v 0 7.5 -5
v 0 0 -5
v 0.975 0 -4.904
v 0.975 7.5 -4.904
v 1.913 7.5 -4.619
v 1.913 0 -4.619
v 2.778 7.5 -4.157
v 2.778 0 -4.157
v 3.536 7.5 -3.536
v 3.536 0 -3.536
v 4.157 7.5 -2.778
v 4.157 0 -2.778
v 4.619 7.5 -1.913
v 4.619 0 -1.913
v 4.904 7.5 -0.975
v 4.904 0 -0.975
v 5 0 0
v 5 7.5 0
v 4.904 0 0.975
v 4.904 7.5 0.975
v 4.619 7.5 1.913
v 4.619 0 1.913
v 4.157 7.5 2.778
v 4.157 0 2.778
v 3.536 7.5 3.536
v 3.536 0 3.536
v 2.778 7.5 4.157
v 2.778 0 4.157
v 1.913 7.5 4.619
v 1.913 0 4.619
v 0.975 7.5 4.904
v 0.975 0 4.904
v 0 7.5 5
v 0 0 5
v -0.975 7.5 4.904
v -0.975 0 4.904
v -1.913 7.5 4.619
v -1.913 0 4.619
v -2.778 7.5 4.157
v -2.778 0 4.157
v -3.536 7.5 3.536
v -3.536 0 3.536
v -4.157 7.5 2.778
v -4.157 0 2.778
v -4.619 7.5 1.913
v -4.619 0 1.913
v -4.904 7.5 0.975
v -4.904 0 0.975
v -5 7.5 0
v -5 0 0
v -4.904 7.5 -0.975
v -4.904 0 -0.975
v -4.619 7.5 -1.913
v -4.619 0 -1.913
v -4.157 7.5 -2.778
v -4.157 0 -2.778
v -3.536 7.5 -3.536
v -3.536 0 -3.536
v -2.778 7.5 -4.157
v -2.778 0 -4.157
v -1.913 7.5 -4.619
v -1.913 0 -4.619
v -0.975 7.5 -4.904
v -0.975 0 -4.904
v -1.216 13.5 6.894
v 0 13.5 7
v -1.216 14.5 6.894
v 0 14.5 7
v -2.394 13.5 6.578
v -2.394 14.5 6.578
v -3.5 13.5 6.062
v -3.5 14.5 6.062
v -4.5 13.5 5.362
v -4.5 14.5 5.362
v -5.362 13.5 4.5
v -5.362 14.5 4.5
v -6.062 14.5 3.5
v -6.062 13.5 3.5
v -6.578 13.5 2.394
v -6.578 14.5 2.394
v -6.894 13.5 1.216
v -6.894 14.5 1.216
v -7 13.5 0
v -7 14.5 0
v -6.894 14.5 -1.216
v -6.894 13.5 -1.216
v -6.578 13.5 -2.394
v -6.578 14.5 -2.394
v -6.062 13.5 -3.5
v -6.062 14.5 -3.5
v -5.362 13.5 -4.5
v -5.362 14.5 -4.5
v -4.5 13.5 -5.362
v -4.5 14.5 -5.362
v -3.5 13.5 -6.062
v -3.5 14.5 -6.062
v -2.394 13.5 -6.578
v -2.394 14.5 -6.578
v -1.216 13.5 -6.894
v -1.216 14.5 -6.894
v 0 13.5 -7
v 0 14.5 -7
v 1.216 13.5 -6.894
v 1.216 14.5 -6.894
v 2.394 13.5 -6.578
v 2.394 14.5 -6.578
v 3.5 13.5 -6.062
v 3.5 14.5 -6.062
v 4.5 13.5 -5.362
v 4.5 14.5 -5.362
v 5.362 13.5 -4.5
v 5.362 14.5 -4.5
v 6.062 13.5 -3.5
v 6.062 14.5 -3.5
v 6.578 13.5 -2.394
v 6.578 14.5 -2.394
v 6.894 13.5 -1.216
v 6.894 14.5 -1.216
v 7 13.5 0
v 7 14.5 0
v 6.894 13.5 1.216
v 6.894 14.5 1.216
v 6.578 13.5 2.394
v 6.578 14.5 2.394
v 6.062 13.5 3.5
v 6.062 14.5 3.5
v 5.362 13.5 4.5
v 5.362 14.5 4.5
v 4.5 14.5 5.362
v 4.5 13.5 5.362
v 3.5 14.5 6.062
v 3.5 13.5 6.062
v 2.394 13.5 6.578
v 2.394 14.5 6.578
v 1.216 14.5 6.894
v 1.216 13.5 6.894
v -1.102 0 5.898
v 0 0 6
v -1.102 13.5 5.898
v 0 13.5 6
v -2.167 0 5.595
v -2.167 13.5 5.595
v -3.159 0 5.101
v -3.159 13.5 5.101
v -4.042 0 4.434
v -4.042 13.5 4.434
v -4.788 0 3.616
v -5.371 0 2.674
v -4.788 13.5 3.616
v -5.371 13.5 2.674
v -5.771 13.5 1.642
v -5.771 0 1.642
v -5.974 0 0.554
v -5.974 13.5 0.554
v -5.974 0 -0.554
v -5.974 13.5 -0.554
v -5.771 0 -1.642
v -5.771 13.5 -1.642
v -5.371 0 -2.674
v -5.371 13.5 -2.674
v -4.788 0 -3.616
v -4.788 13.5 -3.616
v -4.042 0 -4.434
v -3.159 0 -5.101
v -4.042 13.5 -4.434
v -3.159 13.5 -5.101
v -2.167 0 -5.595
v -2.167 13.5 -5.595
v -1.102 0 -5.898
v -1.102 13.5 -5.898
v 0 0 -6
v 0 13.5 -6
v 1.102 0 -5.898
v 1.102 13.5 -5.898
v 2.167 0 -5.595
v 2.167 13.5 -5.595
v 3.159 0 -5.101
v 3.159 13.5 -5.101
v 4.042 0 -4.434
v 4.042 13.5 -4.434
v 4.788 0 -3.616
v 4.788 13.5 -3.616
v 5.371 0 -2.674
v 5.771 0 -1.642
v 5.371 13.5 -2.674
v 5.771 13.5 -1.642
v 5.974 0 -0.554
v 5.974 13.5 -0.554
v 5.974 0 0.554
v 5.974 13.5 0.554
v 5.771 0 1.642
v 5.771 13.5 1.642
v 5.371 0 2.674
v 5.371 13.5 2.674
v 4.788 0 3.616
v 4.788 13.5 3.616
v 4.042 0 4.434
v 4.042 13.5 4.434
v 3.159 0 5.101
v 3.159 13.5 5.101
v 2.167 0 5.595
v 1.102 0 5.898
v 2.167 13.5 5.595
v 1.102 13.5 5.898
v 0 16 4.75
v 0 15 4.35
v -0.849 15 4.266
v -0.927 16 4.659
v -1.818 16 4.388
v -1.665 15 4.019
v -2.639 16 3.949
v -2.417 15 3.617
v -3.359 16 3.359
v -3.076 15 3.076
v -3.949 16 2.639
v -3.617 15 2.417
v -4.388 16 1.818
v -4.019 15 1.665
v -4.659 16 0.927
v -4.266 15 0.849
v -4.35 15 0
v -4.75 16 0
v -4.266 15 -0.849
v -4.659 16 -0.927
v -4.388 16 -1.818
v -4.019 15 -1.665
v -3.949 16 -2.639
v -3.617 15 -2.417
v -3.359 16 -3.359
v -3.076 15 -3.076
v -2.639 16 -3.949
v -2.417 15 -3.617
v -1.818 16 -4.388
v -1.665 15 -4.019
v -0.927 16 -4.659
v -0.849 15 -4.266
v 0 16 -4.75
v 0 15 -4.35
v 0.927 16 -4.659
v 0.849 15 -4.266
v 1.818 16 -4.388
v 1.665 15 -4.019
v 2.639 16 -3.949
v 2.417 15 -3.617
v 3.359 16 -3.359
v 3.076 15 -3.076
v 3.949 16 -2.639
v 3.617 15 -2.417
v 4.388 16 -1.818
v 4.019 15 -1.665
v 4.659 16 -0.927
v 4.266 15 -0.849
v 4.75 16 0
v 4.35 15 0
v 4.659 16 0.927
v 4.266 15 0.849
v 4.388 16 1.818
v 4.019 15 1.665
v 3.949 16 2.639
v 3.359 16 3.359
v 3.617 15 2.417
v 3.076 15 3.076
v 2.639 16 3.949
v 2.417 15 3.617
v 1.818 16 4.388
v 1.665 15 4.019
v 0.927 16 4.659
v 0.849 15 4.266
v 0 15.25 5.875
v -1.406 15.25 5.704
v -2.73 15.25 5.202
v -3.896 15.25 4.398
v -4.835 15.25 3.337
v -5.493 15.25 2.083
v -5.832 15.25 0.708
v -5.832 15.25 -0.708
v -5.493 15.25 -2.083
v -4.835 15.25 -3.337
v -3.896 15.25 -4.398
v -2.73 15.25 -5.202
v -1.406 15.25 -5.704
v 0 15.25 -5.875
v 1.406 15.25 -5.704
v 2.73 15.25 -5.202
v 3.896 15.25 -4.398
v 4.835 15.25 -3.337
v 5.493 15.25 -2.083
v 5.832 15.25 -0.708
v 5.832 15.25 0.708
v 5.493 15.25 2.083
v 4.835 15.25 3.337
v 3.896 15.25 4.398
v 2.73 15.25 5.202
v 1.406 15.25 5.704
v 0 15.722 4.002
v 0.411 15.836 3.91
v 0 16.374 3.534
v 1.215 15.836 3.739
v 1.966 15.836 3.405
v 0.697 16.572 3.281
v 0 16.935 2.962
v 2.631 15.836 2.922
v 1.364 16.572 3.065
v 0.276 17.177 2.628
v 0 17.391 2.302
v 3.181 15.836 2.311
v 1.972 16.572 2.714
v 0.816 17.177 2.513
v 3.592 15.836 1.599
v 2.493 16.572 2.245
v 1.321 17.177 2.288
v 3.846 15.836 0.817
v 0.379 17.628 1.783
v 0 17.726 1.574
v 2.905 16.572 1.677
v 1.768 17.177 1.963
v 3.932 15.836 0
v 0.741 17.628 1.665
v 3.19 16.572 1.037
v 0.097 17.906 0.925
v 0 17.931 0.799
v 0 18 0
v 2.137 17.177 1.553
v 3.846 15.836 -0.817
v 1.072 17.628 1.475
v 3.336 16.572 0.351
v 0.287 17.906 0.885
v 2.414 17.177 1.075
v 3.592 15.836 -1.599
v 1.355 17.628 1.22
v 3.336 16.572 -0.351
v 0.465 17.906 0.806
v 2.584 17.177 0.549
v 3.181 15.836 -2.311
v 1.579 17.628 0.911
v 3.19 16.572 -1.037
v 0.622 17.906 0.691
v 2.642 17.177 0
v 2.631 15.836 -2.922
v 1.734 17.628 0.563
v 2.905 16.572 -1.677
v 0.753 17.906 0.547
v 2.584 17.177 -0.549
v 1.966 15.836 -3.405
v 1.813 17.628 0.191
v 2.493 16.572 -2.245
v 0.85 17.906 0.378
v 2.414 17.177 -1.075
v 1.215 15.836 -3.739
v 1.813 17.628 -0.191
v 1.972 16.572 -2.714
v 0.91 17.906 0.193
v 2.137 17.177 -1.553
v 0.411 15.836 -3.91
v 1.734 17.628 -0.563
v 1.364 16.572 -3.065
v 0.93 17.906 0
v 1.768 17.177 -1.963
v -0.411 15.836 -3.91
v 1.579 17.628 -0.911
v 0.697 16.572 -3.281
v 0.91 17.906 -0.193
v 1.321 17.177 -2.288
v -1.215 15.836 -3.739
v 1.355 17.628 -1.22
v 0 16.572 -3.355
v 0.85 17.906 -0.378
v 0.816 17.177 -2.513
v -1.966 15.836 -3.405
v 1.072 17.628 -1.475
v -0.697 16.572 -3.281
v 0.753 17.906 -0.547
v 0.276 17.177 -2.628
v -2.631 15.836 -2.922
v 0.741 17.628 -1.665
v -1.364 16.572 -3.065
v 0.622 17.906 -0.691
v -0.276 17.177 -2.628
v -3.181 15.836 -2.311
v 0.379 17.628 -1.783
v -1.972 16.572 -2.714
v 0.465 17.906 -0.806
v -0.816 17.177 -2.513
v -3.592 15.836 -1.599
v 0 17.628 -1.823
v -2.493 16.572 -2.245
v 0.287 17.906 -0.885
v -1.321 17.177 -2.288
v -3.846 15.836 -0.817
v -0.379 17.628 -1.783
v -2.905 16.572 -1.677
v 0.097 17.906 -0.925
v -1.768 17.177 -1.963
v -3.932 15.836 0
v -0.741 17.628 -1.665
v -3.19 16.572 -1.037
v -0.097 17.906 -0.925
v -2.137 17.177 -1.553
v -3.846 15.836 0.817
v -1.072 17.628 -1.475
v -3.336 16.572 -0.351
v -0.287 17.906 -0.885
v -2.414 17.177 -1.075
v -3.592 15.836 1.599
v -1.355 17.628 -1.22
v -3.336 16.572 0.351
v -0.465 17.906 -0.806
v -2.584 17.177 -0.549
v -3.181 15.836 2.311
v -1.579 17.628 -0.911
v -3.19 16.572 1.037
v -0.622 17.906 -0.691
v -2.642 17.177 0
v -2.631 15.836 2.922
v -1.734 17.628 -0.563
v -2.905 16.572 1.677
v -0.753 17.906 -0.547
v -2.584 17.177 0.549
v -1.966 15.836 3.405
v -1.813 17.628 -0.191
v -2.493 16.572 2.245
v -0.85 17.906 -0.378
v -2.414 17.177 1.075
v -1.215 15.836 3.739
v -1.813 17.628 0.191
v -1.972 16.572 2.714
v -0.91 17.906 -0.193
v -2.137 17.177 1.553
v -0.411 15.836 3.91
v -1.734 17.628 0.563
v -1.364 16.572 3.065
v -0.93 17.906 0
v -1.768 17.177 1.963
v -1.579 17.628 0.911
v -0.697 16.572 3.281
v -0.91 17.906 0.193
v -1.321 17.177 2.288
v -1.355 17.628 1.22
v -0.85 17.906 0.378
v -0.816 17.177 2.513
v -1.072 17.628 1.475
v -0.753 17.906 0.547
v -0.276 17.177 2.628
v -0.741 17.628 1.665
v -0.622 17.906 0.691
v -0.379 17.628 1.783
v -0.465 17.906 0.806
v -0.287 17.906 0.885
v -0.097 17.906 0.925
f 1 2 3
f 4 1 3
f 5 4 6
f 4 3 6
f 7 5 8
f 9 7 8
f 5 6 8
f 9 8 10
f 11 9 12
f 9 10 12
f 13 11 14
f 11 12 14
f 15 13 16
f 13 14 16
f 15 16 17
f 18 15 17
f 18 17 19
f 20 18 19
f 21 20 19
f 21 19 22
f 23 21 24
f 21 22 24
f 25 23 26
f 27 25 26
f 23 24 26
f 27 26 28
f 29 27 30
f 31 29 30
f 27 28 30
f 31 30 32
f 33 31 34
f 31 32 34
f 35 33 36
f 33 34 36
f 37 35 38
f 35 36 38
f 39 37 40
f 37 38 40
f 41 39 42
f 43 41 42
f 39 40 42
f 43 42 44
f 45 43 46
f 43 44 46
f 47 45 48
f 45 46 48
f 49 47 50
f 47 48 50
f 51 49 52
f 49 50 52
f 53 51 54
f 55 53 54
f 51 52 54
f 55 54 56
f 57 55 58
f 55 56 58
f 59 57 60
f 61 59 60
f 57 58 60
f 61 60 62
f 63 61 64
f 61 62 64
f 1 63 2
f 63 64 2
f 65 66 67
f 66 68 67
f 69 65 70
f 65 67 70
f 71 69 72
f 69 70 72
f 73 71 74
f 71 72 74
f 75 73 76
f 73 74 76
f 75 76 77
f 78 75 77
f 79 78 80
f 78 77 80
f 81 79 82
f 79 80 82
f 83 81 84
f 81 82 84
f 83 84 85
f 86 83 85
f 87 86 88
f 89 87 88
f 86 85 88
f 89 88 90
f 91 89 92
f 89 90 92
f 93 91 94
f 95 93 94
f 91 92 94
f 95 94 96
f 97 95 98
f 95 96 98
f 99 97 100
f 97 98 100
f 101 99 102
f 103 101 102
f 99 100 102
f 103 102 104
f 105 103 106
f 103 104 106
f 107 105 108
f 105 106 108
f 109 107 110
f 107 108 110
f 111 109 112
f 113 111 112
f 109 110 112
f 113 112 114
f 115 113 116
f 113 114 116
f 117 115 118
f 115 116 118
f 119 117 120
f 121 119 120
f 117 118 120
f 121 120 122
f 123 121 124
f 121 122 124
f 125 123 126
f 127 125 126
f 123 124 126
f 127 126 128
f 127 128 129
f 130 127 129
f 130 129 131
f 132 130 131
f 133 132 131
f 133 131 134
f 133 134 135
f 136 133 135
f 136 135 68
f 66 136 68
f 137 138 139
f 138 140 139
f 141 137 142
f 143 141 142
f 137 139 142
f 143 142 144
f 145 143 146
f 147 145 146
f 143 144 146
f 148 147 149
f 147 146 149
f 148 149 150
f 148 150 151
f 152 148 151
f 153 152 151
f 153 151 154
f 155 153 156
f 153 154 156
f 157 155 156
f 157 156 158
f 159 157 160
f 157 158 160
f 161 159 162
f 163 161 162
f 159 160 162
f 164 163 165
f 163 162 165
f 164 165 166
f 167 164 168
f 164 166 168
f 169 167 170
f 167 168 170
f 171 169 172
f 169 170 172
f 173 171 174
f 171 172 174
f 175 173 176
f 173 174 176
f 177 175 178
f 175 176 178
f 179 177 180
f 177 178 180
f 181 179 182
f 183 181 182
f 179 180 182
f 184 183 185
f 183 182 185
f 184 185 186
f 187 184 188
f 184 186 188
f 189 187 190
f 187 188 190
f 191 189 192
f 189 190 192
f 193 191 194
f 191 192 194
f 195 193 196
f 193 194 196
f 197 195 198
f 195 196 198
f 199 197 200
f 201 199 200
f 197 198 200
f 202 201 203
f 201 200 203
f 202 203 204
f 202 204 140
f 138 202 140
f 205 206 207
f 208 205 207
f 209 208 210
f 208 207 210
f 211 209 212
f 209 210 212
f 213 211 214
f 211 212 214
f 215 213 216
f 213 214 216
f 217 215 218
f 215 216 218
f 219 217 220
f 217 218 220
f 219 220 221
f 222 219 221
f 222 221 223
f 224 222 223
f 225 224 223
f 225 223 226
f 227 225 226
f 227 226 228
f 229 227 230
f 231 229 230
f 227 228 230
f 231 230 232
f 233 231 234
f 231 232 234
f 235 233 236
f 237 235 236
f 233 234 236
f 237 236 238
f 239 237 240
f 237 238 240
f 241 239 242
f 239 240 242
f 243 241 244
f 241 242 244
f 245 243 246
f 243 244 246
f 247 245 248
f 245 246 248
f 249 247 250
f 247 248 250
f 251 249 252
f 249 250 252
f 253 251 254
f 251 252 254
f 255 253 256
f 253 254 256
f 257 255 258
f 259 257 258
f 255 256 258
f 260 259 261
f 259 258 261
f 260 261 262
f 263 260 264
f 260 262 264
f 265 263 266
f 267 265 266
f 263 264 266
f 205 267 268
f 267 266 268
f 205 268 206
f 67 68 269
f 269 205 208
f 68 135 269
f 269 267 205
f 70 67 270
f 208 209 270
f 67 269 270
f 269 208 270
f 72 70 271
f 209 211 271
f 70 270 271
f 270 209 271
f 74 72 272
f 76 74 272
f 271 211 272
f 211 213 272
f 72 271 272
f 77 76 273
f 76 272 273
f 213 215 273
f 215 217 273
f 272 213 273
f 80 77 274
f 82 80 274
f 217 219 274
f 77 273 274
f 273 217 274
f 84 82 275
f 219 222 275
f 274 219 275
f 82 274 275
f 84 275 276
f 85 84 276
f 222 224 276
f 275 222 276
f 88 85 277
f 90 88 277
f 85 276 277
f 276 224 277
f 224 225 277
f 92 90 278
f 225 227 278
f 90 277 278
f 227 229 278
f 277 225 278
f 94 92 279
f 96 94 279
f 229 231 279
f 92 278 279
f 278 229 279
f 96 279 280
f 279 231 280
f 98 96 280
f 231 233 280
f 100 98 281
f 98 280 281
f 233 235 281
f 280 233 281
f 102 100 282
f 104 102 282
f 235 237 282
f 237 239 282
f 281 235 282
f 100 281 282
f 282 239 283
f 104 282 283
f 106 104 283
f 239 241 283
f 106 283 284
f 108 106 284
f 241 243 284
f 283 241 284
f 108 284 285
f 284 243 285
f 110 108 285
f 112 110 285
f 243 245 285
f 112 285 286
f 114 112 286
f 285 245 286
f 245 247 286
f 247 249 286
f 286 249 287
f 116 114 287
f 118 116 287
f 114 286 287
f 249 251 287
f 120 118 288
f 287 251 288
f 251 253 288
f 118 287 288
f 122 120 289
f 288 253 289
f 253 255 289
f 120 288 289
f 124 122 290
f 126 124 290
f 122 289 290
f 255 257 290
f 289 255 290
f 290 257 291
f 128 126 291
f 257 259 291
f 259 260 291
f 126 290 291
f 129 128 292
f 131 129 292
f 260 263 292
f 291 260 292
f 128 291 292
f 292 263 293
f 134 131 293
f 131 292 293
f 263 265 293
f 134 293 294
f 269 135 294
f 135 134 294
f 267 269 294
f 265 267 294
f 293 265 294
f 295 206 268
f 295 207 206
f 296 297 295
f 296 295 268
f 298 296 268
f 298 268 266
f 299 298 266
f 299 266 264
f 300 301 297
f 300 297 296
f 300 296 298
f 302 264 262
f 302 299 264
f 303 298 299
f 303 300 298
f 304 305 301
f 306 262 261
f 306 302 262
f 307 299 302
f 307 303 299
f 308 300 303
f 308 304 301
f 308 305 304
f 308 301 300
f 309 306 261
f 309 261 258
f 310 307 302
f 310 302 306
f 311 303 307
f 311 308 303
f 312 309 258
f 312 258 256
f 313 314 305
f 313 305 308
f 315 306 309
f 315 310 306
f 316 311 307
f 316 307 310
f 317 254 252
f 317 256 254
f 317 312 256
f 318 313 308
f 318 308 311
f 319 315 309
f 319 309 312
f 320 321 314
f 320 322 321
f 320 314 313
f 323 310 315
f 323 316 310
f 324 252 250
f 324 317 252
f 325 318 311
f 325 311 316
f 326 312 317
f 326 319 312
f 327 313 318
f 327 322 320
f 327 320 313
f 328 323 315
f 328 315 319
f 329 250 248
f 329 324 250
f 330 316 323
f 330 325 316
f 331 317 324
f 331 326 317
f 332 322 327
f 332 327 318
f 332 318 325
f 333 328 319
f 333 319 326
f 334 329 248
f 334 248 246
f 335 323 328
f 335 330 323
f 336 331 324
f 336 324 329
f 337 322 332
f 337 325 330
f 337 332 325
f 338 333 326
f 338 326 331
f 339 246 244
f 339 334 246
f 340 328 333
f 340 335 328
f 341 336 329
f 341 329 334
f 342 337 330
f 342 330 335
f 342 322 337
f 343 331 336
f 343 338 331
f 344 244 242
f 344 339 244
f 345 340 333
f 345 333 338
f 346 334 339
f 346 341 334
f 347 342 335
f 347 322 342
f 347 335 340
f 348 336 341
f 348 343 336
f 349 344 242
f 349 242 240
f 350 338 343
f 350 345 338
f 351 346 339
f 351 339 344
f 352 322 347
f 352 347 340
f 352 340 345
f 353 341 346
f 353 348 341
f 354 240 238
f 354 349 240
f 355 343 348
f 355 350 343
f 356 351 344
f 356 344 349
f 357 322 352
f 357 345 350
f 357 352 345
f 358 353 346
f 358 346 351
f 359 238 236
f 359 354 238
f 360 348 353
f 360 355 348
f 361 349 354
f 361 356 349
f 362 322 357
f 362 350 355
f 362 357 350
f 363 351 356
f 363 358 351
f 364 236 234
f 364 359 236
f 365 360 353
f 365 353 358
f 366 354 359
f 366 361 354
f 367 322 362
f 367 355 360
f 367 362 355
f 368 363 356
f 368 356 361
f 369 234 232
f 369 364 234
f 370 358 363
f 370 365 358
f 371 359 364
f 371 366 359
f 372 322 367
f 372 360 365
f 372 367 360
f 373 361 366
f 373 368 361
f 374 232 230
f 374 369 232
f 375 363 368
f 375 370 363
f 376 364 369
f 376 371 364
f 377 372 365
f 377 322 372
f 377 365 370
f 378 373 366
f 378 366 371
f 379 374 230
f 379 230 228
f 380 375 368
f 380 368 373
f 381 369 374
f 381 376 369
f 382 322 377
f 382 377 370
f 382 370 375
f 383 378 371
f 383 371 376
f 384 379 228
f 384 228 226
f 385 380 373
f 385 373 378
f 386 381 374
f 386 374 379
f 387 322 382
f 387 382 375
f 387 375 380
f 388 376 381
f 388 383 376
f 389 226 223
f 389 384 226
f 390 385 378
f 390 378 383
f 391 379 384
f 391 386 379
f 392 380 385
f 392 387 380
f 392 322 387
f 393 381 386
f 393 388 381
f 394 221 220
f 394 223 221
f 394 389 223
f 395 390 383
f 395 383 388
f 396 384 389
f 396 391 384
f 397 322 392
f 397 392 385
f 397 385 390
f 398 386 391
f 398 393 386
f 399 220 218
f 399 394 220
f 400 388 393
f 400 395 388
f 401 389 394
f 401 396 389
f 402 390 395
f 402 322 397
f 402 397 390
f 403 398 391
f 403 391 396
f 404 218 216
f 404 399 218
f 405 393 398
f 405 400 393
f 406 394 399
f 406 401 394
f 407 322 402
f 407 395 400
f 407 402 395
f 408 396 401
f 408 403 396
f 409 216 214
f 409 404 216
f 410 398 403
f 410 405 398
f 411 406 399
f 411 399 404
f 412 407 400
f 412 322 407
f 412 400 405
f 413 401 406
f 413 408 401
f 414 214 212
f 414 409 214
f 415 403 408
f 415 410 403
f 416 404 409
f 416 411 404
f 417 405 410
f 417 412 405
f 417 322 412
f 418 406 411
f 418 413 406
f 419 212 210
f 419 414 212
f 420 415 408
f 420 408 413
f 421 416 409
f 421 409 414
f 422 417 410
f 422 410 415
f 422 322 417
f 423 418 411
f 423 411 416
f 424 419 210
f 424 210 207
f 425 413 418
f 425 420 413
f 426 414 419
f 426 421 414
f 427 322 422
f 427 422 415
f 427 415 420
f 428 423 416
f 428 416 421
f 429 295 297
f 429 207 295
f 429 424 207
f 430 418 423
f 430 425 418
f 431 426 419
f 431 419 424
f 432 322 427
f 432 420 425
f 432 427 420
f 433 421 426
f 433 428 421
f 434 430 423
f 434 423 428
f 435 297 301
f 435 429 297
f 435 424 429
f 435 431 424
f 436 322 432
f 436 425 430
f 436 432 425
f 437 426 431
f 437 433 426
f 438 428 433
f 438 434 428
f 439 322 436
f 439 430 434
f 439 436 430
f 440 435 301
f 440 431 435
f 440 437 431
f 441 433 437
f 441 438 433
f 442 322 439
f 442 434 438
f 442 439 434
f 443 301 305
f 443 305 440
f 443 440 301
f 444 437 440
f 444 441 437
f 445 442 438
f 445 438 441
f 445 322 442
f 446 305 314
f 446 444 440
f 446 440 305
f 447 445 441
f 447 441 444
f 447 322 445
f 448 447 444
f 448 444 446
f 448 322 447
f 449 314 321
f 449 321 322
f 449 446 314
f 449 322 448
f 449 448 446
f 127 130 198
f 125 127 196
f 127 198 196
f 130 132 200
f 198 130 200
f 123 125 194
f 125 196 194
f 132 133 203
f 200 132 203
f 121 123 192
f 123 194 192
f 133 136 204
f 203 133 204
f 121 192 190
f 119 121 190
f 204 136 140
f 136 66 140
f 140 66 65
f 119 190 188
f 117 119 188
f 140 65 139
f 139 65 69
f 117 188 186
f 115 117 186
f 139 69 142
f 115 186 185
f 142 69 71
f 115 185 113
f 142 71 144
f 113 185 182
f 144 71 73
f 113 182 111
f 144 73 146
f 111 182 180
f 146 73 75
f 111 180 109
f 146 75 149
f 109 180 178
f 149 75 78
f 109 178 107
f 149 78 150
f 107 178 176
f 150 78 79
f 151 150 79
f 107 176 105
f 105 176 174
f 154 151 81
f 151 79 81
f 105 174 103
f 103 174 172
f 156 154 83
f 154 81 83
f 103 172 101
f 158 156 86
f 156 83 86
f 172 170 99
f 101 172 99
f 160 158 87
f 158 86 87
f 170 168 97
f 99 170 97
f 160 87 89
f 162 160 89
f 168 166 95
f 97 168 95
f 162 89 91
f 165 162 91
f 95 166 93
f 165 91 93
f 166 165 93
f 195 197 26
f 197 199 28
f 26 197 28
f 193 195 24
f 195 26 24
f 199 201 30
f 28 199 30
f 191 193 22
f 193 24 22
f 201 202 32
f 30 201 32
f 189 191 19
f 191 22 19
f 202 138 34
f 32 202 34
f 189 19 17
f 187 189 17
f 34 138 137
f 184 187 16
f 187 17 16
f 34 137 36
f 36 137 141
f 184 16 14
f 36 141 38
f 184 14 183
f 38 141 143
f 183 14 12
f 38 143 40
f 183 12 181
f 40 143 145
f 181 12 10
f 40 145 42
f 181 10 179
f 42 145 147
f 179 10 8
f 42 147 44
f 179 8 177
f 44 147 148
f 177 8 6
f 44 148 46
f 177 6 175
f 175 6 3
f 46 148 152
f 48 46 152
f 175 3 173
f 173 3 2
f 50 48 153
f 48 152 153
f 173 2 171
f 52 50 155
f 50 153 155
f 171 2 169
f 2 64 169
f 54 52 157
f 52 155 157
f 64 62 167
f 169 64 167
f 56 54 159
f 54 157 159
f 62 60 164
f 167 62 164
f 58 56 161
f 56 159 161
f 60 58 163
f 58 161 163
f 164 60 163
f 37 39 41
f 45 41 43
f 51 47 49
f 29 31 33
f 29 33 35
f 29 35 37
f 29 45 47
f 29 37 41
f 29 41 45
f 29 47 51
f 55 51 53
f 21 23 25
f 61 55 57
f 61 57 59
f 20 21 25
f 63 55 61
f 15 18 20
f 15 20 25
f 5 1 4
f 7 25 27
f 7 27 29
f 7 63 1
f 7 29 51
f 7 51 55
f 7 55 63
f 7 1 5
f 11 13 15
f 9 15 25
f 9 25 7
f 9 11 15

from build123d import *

# Parameters (mm, degrees)
DOME2_FACE_RADIUS  = 4.35
DOME2_HEIGHT       = 3
SKETCH6_R          = 5
CUT_EXTRUDE1_DEPTH = 7.5


with BuildPart() as part:
    # Sketch1 → Revolve1 (revolve)
    with BuildSketch(Plane(origin=(0, 0, 0), x_dir=(0, 0, -1), z_dir=(1, 0, 0))):
        Polygon((0, 0), (-6, 0), (-6, 13.5), (-7, 13.5), (-7, 14.5), (-4.75, 16), (-4.35, 15), (0, 15), align=None)
    revolve(axis=Axis((0, 15, 0), (0, -1, 0)))

    # Dome2: a dome of height H over a round flat face of radius A is a cap of a sphere of radius (A * A + H * H) / (2 * H)
    dome2_r = (DOME2_FACE_RADIUS * DOME2_FACE_RADIUS + DOME2_HEIGHT * DOME2_HEIGHT) / (2 * DOME2_HEIGHT)
    dome2_base = Plane((0, 15, 0), z_dir=(0, 1, 0))
    with Locations(dome2_base.offset(DOME2_HEIGHT - dome2_r)):
        dome2_ball = Sphere(dome2_r, mode=Mode.PRIVATE)
    add(split(dome2_ball, bisect_by=dome2_base, keep=Keep.TOP, mode=Mode.PRIVATE))

    # Sketch6 → Cut-Extrude1 (cut)
    with BuildSketch(Plane.XZ):
        with Locations(Location((0, 0, 0), (0, 0, 270))):
            Circle(SKETCH6_R)
    extrude(amount=-CUT_EXTRUDE1_DEPTH, mode=Mode.SUBTRACT)


solid = part.part
